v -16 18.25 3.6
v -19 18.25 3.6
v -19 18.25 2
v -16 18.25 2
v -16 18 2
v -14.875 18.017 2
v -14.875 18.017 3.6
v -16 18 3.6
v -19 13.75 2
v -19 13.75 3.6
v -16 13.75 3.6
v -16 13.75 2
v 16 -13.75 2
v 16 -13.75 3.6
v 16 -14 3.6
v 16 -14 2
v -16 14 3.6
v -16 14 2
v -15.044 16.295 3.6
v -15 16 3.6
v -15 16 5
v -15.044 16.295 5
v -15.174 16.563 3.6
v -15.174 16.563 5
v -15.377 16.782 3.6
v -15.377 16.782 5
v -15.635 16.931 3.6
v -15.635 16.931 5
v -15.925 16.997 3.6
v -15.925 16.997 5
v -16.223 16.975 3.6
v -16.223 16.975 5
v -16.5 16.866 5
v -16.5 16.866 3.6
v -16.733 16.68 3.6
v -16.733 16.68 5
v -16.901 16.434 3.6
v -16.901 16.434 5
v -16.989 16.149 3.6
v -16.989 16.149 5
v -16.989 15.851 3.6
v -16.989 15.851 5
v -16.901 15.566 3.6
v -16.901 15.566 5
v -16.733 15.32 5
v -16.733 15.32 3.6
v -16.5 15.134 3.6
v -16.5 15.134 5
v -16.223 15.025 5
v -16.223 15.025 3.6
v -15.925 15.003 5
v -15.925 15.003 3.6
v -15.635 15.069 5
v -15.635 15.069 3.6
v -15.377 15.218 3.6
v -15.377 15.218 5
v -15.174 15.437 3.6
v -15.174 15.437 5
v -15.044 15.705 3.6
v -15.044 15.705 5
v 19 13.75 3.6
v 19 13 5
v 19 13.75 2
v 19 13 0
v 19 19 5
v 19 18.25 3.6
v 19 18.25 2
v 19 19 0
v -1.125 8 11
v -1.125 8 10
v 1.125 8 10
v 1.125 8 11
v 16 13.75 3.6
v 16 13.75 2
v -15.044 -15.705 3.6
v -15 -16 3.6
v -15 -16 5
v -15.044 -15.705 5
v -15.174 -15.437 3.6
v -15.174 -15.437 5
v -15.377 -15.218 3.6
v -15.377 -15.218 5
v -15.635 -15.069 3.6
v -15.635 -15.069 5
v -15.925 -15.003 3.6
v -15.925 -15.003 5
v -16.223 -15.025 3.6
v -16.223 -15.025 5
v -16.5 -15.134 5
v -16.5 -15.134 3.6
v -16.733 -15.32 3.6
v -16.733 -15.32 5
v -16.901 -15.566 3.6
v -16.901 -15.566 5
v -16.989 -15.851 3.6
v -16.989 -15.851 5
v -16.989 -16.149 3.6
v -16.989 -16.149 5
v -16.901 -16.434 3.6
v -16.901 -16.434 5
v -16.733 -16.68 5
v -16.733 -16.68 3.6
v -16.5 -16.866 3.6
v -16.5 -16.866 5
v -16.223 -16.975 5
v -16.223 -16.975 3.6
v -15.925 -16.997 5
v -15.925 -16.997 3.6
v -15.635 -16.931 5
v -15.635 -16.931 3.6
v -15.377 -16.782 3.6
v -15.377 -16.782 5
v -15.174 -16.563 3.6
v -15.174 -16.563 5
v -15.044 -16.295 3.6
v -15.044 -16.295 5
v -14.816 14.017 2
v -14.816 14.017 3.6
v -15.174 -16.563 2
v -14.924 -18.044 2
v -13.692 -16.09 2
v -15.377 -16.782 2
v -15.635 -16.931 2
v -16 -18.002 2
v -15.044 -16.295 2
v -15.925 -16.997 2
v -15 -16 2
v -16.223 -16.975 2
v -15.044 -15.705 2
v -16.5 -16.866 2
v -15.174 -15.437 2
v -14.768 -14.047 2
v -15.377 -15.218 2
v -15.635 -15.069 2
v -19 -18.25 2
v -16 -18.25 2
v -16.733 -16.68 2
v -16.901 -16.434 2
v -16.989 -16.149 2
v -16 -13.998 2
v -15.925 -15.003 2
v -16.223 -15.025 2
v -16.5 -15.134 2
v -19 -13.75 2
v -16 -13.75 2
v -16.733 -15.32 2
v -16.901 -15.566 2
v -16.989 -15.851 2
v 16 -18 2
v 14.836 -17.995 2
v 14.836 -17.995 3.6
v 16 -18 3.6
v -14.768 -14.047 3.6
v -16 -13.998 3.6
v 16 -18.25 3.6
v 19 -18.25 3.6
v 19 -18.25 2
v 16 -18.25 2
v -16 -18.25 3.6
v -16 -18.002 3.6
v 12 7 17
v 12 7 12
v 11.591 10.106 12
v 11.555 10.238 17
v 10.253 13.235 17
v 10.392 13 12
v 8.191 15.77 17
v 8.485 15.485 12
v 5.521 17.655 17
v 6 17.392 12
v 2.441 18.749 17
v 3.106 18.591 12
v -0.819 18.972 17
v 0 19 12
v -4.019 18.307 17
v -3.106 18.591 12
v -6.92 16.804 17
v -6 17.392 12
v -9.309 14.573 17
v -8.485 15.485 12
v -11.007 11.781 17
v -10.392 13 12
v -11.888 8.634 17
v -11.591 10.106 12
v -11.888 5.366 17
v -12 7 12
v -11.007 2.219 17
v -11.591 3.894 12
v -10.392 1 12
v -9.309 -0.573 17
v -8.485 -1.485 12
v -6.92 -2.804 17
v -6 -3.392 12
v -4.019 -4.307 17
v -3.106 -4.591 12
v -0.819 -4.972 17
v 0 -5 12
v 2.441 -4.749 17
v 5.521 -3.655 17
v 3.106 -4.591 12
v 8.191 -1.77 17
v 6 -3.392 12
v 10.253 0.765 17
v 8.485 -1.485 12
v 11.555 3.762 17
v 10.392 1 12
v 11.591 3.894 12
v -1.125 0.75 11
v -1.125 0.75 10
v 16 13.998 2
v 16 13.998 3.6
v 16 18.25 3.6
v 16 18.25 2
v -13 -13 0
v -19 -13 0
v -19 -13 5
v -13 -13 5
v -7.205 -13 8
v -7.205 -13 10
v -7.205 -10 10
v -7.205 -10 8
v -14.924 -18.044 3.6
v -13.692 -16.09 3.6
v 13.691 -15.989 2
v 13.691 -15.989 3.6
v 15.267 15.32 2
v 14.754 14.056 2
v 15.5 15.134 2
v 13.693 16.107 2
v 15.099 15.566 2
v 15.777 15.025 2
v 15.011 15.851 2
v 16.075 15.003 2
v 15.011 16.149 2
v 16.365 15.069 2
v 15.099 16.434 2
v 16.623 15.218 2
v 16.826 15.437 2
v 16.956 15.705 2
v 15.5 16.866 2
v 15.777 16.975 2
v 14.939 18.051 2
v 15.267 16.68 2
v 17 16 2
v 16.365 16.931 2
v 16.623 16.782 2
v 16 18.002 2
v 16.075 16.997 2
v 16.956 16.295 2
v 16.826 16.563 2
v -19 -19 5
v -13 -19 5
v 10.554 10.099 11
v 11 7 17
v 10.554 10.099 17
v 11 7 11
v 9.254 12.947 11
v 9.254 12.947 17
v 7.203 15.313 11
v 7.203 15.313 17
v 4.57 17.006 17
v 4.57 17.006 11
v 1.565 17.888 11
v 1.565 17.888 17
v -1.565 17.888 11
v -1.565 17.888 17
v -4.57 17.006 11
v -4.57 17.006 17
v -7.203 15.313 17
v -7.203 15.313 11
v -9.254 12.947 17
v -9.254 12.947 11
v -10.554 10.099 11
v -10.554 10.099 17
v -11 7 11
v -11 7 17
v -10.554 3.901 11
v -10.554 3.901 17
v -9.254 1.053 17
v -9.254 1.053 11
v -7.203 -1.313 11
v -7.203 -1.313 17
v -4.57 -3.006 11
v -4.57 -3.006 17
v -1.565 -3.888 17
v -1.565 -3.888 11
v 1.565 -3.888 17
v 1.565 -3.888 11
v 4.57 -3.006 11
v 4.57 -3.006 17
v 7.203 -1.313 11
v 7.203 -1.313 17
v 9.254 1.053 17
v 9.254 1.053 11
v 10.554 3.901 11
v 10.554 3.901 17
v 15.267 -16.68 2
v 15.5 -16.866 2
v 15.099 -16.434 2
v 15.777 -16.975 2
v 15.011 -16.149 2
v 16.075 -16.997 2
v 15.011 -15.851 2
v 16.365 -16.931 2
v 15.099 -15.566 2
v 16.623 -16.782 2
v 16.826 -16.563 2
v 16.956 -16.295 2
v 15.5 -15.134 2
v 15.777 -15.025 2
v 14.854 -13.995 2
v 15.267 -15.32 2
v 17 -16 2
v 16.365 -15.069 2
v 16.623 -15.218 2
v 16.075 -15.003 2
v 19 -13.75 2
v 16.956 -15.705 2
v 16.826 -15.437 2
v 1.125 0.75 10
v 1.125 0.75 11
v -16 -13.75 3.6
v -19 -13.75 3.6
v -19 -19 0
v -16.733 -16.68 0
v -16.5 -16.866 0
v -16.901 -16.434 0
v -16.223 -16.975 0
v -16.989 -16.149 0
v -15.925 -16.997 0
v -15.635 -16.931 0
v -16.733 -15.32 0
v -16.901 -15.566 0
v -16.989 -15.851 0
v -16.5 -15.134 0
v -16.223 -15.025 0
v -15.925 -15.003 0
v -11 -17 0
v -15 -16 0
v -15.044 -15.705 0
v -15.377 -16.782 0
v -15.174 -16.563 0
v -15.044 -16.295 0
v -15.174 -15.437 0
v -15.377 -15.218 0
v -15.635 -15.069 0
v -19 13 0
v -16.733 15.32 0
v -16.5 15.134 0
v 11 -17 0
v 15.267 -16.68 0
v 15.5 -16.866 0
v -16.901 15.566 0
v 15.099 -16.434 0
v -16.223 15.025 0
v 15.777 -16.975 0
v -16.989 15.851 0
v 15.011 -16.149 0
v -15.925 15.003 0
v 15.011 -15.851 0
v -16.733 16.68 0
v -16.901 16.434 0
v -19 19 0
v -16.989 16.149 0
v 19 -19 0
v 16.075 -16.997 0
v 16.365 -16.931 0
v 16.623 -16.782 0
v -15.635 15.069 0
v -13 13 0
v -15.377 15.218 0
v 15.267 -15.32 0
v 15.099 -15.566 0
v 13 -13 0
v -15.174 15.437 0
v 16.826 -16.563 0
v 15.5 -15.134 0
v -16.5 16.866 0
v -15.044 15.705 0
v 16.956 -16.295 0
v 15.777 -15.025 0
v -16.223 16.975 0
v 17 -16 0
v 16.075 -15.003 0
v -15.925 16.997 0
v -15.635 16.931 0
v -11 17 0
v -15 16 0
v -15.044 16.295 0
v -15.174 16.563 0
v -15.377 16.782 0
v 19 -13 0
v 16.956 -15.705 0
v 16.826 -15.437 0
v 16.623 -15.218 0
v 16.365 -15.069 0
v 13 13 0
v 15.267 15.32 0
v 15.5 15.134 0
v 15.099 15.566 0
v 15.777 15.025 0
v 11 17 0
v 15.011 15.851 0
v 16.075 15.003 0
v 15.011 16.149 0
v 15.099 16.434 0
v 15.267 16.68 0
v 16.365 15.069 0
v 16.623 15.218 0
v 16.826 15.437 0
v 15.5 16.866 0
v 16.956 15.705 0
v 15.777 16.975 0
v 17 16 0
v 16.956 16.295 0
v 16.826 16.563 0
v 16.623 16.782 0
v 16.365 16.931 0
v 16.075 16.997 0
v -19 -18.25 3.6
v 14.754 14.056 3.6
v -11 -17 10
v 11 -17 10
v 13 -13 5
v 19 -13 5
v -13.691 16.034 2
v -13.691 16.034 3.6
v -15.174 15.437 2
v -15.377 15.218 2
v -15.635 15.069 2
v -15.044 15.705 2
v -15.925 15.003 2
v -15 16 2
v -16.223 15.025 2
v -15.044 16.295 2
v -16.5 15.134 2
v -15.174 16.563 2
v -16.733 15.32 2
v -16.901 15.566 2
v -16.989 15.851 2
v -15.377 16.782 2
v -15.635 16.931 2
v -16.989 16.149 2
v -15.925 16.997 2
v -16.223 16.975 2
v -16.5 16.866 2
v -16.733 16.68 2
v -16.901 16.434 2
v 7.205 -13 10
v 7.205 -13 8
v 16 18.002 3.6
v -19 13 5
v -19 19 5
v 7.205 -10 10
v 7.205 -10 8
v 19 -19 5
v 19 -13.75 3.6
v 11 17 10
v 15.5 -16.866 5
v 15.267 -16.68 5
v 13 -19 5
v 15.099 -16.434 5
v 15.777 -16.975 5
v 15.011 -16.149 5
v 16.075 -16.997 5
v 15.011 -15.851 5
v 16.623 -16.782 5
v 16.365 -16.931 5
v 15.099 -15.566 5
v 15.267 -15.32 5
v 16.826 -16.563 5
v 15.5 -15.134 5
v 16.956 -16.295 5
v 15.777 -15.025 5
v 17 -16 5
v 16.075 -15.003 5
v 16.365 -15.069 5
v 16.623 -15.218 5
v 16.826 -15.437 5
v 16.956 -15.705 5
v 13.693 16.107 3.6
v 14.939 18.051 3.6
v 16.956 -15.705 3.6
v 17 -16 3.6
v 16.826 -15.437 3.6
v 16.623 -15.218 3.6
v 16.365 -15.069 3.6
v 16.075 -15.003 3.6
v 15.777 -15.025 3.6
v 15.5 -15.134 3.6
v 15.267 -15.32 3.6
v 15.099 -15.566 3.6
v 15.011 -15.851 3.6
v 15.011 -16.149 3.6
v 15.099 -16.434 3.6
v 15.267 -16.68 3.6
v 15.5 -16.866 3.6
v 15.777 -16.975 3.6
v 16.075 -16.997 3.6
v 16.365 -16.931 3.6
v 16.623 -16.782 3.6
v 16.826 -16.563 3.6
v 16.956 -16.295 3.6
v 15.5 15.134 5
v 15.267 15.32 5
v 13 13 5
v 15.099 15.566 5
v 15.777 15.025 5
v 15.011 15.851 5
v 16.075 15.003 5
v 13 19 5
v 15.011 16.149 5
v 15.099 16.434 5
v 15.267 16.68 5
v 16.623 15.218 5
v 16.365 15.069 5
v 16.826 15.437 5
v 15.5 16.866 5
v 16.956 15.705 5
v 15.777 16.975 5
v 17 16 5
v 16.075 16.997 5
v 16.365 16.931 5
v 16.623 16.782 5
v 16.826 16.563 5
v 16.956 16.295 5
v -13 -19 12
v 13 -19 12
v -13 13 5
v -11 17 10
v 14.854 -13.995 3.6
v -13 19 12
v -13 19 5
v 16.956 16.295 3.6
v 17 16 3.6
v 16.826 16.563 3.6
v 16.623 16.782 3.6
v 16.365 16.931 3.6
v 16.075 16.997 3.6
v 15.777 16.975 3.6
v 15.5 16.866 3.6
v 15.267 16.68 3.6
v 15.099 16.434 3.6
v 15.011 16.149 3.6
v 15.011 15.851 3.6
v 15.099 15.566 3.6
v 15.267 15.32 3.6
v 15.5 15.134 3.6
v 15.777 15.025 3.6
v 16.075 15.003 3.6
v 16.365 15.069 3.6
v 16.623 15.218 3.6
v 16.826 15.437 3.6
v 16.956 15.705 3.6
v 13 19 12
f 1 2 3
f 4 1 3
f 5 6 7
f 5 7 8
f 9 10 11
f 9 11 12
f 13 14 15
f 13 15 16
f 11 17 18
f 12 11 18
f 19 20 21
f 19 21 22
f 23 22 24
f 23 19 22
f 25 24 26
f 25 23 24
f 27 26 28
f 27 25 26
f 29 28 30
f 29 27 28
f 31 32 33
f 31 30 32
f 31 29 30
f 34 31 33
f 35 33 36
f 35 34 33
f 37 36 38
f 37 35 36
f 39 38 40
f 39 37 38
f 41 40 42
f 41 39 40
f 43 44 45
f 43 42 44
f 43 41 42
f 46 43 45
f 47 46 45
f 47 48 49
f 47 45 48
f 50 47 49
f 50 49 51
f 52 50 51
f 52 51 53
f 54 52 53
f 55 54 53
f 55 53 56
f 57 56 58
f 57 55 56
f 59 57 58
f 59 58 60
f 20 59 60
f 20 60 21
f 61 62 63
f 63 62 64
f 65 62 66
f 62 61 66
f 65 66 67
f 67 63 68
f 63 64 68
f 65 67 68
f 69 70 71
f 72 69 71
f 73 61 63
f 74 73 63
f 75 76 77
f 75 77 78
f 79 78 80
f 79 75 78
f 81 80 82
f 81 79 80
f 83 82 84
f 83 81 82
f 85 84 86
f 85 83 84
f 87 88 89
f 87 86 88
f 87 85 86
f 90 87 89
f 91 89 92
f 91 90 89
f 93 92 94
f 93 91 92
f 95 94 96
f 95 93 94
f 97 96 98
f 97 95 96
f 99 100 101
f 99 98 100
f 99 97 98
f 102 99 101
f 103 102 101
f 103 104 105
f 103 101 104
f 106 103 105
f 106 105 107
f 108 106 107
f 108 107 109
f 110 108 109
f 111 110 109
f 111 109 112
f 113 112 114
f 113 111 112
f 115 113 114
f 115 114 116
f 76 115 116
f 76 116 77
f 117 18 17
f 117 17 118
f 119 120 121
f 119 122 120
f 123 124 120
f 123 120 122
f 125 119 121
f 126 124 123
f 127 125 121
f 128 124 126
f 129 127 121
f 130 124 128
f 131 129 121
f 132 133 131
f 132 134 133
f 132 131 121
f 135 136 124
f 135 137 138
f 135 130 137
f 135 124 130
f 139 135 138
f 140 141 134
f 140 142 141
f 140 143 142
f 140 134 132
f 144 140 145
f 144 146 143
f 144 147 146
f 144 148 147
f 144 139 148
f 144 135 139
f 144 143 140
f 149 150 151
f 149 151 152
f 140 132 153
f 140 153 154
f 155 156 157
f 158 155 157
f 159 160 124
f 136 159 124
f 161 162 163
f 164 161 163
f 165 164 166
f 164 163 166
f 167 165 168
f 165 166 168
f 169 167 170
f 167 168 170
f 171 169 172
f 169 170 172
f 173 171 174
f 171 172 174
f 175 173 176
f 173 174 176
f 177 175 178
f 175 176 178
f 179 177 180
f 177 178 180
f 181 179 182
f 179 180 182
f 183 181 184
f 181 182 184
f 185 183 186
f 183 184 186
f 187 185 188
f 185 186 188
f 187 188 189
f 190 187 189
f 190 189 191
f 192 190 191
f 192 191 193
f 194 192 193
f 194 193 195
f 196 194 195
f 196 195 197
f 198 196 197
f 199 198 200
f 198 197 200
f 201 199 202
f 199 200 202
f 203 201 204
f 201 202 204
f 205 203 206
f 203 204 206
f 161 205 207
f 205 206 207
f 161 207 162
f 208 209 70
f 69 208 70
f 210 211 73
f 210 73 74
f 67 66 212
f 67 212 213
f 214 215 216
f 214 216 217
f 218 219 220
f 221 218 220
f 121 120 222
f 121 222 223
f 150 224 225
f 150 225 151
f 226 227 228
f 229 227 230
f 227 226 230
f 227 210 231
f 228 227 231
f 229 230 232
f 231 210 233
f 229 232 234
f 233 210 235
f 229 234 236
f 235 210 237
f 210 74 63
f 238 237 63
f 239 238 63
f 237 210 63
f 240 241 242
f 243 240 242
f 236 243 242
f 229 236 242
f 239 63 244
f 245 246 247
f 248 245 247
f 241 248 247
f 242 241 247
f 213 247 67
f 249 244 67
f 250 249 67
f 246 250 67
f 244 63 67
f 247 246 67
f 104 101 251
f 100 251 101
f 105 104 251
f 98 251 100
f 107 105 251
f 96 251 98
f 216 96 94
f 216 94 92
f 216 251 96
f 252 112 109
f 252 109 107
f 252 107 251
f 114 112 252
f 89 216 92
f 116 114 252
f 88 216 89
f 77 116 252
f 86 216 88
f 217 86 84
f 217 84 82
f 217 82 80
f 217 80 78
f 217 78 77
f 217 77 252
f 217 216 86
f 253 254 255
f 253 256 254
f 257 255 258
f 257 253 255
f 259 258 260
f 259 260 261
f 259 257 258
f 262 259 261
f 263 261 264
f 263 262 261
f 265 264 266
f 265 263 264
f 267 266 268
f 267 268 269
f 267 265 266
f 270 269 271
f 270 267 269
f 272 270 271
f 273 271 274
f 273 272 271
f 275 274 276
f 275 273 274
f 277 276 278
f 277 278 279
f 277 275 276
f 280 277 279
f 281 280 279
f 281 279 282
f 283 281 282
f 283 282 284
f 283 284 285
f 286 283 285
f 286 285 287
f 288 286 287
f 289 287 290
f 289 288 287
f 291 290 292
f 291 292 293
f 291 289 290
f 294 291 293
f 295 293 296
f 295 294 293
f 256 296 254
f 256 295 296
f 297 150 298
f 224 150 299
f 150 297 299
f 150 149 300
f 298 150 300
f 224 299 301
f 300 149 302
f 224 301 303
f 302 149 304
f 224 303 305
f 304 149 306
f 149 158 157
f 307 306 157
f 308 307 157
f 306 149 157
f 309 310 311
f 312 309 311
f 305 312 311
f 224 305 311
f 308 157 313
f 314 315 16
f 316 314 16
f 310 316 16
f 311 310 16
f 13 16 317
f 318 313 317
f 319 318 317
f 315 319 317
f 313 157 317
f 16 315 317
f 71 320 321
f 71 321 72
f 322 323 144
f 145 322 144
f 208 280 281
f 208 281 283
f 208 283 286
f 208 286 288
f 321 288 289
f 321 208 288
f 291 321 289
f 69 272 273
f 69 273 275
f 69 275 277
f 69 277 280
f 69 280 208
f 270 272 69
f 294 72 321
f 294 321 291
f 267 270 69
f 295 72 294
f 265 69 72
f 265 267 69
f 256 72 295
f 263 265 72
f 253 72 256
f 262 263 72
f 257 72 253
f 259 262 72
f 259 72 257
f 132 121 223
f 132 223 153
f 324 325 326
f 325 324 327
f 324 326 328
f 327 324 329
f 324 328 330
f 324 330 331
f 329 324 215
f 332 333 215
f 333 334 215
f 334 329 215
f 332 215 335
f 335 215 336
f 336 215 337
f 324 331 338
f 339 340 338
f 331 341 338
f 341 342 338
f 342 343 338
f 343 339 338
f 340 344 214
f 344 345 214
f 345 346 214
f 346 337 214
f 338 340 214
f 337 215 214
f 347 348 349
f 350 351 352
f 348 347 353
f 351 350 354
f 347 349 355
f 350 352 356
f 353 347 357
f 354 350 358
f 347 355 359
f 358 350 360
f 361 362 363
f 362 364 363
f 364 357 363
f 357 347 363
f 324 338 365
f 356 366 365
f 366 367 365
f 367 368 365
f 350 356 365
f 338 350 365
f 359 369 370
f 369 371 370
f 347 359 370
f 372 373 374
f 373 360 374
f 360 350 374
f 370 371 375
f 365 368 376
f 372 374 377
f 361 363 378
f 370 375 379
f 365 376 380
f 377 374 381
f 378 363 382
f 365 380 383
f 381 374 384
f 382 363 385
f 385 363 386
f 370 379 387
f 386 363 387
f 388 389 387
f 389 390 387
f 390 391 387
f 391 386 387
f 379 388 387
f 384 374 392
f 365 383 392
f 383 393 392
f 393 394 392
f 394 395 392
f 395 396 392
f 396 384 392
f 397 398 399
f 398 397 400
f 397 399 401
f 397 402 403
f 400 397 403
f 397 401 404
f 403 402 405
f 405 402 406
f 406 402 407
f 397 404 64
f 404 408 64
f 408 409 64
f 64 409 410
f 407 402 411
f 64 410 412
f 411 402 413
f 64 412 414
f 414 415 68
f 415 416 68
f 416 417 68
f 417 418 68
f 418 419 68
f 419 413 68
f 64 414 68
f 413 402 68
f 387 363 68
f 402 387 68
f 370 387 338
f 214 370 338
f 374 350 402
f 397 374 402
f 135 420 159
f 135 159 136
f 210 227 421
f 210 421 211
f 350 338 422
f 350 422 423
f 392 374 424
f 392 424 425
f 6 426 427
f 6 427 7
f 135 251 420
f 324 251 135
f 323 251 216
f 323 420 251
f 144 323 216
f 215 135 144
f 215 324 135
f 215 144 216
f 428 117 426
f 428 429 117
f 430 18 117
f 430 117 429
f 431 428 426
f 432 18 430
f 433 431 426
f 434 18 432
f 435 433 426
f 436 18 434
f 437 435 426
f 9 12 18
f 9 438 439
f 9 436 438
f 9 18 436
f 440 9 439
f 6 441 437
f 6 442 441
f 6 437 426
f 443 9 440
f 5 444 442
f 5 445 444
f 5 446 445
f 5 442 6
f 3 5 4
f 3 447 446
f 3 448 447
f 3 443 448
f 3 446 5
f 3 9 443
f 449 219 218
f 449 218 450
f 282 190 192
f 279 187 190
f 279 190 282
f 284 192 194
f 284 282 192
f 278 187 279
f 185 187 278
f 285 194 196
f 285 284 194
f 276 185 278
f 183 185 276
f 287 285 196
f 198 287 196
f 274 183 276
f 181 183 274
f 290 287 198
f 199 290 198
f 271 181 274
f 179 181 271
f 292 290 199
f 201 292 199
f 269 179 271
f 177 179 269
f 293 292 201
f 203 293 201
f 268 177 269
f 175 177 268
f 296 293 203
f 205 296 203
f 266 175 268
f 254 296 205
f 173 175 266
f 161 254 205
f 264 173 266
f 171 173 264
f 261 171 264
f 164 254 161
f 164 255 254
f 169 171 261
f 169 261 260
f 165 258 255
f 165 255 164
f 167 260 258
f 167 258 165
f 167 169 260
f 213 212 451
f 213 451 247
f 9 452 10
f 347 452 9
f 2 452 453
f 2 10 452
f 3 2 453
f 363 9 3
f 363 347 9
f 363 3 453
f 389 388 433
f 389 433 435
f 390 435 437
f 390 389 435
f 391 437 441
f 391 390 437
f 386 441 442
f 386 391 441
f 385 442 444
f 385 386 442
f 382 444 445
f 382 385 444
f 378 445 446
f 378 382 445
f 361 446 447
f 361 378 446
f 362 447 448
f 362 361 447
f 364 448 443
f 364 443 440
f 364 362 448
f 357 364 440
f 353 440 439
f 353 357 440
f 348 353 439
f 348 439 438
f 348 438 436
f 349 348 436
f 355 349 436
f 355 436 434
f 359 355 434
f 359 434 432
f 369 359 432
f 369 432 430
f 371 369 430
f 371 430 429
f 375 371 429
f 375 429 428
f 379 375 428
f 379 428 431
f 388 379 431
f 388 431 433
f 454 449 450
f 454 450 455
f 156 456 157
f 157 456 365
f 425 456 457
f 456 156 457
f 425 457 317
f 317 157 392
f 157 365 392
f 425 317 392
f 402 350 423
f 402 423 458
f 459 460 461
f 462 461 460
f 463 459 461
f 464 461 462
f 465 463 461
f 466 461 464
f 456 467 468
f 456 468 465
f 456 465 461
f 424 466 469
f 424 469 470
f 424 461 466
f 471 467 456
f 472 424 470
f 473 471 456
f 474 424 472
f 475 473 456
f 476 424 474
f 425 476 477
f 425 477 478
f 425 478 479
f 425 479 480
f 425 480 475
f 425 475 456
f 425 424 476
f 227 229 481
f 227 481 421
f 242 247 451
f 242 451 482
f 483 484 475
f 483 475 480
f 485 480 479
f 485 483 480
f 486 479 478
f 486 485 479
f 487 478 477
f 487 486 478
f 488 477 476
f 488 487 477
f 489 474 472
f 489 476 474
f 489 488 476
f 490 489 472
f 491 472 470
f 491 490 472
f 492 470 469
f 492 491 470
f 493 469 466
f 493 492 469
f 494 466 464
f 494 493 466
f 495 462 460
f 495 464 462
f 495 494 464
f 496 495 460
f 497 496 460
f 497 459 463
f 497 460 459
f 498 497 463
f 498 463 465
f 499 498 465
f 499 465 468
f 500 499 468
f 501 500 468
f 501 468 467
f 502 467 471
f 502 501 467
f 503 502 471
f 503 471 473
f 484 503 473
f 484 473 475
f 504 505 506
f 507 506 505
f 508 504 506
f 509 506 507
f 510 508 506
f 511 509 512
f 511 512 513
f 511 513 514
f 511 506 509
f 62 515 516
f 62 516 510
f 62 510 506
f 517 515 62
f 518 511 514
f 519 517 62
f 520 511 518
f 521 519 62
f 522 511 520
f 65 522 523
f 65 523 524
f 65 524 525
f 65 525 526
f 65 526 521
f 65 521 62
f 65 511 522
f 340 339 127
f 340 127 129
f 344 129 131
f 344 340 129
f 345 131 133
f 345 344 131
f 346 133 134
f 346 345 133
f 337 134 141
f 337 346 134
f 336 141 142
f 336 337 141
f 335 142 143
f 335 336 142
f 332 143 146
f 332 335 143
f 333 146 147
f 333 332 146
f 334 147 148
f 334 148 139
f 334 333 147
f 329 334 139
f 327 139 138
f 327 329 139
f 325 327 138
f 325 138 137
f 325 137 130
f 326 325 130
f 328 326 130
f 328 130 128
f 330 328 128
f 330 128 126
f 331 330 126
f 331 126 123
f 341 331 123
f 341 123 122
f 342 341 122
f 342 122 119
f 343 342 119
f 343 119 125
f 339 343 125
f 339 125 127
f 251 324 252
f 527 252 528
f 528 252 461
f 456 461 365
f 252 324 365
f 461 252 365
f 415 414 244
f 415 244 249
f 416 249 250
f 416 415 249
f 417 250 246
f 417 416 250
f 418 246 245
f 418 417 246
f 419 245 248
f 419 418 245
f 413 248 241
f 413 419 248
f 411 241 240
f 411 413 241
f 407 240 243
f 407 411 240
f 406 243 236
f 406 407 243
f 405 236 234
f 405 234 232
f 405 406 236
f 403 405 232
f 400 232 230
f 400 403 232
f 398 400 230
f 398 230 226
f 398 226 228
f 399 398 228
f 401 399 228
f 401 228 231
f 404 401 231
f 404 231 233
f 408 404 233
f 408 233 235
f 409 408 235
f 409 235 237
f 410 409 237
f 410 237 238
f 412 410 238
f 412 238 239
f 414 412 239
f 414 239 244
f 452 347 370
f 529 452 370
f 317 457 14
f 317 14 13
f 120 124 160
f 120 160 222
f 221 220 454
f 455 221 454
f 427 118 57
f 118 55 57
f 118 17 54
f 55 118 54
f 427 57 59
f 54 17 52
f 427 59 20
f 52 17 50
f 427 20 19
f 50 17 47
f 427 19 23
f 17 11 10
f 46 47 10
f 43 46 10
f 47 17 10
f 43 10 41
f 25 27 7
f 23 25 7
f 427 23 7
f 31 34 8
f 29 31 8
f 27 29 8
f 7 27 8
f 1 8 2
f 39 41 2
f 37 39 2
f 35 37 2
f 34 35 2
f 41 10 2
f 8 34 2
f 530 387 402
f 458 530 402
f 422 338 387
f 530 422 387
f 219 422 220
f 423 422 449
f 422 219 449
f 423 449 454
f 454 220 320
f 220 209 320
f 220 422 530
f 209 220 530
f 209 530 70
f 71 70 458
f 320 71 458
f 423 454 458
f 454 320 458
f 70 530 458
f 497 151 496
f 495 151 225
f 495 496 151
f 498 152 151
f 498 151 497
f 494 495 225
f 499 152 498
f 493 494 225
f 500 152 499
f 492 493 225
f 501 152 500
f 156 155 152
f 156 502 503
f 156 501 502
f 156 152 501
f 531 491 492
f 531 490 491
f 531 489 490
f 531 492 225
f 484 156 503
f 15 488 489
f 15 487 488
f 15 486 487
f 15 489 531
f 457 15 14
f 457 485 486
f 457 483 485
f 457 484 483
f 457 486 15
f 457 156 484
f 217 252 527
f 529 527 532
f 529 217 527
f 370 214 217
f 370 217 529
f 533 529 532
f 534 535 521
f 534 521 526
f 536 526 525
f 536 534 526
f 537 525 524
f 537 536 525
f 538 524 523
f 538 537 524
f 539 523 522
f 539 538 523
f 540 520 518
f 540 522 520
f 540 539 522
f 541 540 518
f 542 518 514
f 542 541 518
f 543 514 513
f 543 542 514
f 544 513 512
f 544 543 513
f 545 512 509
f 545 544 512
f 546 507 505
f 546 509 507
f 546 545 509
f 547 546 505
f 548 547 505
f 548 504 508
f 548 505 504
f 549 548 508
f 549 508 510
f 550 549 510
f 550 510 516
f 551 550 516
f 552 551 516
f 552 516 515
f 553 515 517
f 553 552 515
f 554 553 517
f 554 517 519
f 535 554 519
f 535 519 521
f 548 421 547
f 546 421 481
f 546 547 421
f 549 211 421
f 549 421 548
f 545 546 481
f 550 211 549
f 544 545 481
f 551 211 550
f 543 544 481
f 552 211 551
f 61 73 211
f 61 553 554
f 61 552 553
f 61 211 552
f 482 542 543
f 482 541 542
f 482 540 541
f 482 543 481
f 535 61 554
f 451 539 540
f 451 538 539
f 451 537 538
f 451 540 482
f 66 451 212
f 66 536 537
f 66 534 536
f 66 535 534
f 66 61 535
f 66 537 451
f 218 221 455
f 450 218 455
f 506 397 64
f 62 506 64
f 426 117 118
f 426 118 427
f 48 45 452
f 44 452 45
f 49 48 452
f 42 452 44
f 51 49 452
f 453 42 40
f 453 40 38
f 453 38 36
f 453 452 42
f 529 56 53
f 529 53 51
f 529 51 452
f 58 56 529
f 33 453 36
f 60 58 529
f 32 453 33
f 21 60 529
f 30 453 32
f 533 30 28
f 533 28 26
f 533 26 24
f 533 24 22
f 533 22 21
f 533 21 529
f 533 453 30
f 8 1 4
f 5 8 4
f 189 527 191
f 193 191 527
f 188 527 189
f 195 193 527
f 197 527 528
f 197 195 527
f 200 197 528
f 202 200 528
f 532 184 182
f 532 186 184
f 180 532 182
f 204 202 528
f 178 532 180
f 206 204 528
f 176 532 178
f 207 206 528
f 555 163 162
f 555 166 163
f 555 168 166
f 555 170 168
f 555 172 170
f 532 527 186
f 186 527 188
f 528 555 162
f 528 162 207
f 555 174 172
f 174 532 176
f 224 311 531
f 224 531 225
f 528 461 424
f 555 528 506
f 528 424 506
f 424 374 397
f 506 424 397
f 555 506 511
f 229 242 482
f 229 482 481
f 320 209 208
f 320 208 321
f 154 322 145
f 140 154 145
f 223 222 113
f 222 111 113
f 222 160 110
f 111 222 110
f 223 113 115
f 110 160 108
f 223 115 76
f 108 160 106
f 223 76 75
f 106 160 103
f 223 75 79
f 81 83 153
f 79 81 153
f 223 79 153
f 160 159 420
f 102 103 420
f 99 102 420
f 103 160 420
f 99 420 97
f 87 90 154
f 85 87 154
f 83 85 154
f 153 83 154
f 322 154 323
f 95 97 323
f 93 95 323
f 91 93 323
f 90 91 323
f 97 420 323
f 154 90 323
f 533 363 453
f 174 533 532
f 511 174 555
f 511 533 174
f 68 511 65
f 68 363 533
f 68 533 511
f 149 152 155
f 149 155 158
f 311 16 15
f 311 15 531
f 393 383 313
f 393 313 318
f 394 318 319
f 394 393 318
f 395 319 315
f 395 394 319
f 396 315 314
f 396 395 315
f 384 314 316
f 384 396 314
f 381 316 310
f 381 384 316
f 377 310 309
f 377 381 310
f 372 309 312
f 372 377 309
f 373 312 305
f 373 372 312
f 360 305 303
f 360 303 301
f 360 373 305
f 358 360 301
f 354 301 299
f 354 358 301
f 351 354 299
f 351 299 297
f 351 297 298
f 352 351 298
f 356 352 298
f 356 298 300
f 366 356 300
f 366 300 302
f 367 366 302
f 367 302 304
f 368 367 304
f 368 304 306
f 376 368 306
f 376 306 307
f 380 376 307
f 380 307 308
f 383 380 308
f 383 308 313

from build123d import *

# Parameters (mm, degrees)
SKETCH_1_W          = 26
SKETCH_1_H          = 38
EXTRUDE_1_DEPTH     = 12
SKETCH_2_W          = 22
SKETCH_2_H          = 34
CUT_EXTRUDE_1_DEPTH = 10
SKETCH_3_W          = 2.25
SKETCH_3_H          = 7.25
CUT_EXTRUDE_3_DEPTH = 12
SKETCH_4_W          = 6
SKETCH_4_H          = 6
EXTRUDE_2_DEPTH     = 5
SKETCH_5_R          = 1
CUT_EXTRUDE_4_DEPTH = 13
CUT_EXTRUDE_START   = 2
CUT_EXTRUDE_5_DEPTH = 1.6
SKETCH_7_R          = 12
SKETCH_7_R_2        = 11
EXTRUDE_3_DEPTH     = 5
SKETCH_9_R          = 11
CUT_EXTRUDE_7_DEPTH = 1
SKETCH_10_W         = 14.41096837
SKETCH_10_H         = 3
EXTRUDE_4_DEPTH     = 2
CUT_EXTRUDE_START_2 = 20
SKETCH_11_W         = 1.6
SKETCH_11_H         = 4.5
CUT_EXTRUDE_8_DEPTH = 4
CUT_EXTRUDE_START_3 = -20
SKETCH_13_W         = 1.6
SKETCH_13_H         = 4.5
CUT_EXTRUDE_9_DEPTH = 4


with BuildPart() as part:
    # ｽｹｯﾁ1 → ﾎﾞｽ - 押し出し1 (new body)
    with BuildSketch(Plane.XY):
        Rectangle(SKETCH_1_W, SKETCH_1_H)
    extrude(amount=EXTRUDE_1_DEPTH)

    # ｽｹｯﾁ2 → ｶｯﾄ - 押し出し1 (cut)
    with BuildSketch(Plane.XY):
        Rectangle(SKETCH_2_W, SKETCH_2_H)
    extrude(amount=CUT_EXTRUDE_1_DEPTH, mode=Mode.SUBTRACT)

    # ｽｹｯﾁ3 → ｶｯﾄ - 押し出し3 (cut)
    with BuildSketch(Plane.XY):
        with Locations((0, 4.375)):
            Rectangle(SKETCH_3_W, SKETCH_3_H)
    extrude(amount=CUT_EXTRUDE_3_DEPTH, mode=Mode.SUBTRACT)

    # ｽｹｯﾁ4 → ﾎﾞｽ - 押し出し2 (add)
    with BuildSketch(Plane.XY):
        with Locations((16, 16)):
            Rectangle(SKETCH_4_W, SKETCH_4_H)
        with Locations((16, -16)):
            Rectangle(SKETCH_4_W, SKETCH_4_H)
        with Locations((-16, -16)):
            Rectangle(SKETCH_4_W, SKETCH_4_H)
        with Locations((-16, 16)):
            Rectangle(SKETCH_4_W, SKETCH_4_H)
    extrude(amount=EXTRUDE_2_DEPTH)

    # ｽｹｯﾁ5 → ｶｯﾄ - 押し出し4 (cut, through all)
    with BuildSketch(Plane.XY):
        with Locations((-16, 16)):
            Circle(SKETCH_5_R)
        with Locations((-16, -16)):
            Circle(SKETCH_5_R)
        with Locations((16, -16)):
            Circle(SKETCH_5_R)
        with Locations((16, 16)):
            Circle(SKETCH_5_R)
    extrude(amount=CUT_EXTRUDE_4_DEPTH, mode=Mode.SUBTRACT)

    # ｽｹｯﾁ6 → ｶｯﾄ - 押し出し5 (cut)
    with BuildSketch(Plane.XY.offset(CUT_EXTRUDE_START)):
        Polygon((-17.184124892, 17.98272075), (-18.309148984, 15.965878137), (-17.125024092, 13.983157387), (-14.815875108, 14.01727925), (-13.690851016, 16.034121863), (-14.874975908, 18.016842613), align=None)
        Polygon((-17.07560545, -13.956374239), (-18.307634549, -15.909688764), (-17.2320291, -17.953314524), (-14.92439455, -18.043625761), (-13.692365451, -16.090311236), (-14.7679709, -14.046685476), align=None)
        Polygon((14.939341307, 18.051423035), (13.693086191, 16.107154145), (14.753744884, 14.055731109), (17.060658693, 13.948576965), (18.306913809, 15.892845855), (17.246255116, 17.944268891), align=None)
        Polygon((14.854466591, -13.994735294), (13.690623119, -15.98942868), (14.836156527, -17.994693386), (17.145533409, -18.005264706), (18.309376881, -16.01057132), (17.163843473, -14.005306614), align=None)
    extrude(amount=CUT_EXTRUDE_5_DEPTH, mode=Mode.SUBTRACT)

    # ｽｹｯﾁ7 → ﾎﾞｽ - 押し出し3 (add)
    with BuildSketch(Plane.XY.offset(12)):
        with Locations((0, 7)):
            Circle(SKETCH_7_R)
        with Locations((0, 7)):
            Circle(SKETCH_7_R_2, mode=Mode.SUBTRACT)
    extrude(amount=EXTRUDE_3_DEPTH)

    # ｽｹｯﾁ9 → ｶｯﾄ - 押し出し7 (cut)
    with BuildSketch(Plane.XY.offset(12)):
        with Locations((0, 7)):
            Circle(SKETCH_9_R)
    extrude(amount=-CUT_EXTRUDE_7_DEPTH, mode=Mode.SUBTRACT)

    # ｽｹｯﾁ10 → ﾎﾞｽ - 押し出し4 (add)
    with BuildSketch(Plane.XY.offset(10)):
        with Locations((0, -11.5)):
            Rectangle(SKETCH_10_W, SKETCH_10_H)
    extrude(amount=-EXTRUDE_4_DEPTH)

    # ｽｹｯﾁ11 → ｶｯﾄ - 押し出し8 (cut)
    with BuildSketch(Plane(origin=(0, 0, 0), x_dir=(0, 0, -1), z_dir=(1, 0, 0)).offset(CUT_EXTRUDE_START_2)):
        with Locations((-2.8, 16)):
            Rectangle(SKETCH_11_W, SKETCH_11_H)
        with Locations((-2.8, -16)):
            Rectangle(SKETCH_11_W, SKETCH_11_H)
    extrude(amount=-CUT_EXTRUDE_8_DEPTH, mode=Mode.SUBTRACT)

    # ｽｹｯﾁ13 → ｶｯﾄ - 押し出し9 (cut)
    with BuildSketch(Plane(origin=(0, 0, 0), x_dir=(0, 0, -1), z_dir=(1, 0, 0)).offset(CUT_EXTRUDE_START_3)):
        with Locations((-2.8, 16)):
            Rectangle(SKETCH_13_W, SKETCH_13_H)
        with Locations((-2.8, -16)):
            Rectangle(SKETCH_13_W, SKETCH_13_H)
    extrude(amount=CUT_EXTRUDE_9_DEPTH, mode=Mode.SUBTRACT)


solid = part.part
